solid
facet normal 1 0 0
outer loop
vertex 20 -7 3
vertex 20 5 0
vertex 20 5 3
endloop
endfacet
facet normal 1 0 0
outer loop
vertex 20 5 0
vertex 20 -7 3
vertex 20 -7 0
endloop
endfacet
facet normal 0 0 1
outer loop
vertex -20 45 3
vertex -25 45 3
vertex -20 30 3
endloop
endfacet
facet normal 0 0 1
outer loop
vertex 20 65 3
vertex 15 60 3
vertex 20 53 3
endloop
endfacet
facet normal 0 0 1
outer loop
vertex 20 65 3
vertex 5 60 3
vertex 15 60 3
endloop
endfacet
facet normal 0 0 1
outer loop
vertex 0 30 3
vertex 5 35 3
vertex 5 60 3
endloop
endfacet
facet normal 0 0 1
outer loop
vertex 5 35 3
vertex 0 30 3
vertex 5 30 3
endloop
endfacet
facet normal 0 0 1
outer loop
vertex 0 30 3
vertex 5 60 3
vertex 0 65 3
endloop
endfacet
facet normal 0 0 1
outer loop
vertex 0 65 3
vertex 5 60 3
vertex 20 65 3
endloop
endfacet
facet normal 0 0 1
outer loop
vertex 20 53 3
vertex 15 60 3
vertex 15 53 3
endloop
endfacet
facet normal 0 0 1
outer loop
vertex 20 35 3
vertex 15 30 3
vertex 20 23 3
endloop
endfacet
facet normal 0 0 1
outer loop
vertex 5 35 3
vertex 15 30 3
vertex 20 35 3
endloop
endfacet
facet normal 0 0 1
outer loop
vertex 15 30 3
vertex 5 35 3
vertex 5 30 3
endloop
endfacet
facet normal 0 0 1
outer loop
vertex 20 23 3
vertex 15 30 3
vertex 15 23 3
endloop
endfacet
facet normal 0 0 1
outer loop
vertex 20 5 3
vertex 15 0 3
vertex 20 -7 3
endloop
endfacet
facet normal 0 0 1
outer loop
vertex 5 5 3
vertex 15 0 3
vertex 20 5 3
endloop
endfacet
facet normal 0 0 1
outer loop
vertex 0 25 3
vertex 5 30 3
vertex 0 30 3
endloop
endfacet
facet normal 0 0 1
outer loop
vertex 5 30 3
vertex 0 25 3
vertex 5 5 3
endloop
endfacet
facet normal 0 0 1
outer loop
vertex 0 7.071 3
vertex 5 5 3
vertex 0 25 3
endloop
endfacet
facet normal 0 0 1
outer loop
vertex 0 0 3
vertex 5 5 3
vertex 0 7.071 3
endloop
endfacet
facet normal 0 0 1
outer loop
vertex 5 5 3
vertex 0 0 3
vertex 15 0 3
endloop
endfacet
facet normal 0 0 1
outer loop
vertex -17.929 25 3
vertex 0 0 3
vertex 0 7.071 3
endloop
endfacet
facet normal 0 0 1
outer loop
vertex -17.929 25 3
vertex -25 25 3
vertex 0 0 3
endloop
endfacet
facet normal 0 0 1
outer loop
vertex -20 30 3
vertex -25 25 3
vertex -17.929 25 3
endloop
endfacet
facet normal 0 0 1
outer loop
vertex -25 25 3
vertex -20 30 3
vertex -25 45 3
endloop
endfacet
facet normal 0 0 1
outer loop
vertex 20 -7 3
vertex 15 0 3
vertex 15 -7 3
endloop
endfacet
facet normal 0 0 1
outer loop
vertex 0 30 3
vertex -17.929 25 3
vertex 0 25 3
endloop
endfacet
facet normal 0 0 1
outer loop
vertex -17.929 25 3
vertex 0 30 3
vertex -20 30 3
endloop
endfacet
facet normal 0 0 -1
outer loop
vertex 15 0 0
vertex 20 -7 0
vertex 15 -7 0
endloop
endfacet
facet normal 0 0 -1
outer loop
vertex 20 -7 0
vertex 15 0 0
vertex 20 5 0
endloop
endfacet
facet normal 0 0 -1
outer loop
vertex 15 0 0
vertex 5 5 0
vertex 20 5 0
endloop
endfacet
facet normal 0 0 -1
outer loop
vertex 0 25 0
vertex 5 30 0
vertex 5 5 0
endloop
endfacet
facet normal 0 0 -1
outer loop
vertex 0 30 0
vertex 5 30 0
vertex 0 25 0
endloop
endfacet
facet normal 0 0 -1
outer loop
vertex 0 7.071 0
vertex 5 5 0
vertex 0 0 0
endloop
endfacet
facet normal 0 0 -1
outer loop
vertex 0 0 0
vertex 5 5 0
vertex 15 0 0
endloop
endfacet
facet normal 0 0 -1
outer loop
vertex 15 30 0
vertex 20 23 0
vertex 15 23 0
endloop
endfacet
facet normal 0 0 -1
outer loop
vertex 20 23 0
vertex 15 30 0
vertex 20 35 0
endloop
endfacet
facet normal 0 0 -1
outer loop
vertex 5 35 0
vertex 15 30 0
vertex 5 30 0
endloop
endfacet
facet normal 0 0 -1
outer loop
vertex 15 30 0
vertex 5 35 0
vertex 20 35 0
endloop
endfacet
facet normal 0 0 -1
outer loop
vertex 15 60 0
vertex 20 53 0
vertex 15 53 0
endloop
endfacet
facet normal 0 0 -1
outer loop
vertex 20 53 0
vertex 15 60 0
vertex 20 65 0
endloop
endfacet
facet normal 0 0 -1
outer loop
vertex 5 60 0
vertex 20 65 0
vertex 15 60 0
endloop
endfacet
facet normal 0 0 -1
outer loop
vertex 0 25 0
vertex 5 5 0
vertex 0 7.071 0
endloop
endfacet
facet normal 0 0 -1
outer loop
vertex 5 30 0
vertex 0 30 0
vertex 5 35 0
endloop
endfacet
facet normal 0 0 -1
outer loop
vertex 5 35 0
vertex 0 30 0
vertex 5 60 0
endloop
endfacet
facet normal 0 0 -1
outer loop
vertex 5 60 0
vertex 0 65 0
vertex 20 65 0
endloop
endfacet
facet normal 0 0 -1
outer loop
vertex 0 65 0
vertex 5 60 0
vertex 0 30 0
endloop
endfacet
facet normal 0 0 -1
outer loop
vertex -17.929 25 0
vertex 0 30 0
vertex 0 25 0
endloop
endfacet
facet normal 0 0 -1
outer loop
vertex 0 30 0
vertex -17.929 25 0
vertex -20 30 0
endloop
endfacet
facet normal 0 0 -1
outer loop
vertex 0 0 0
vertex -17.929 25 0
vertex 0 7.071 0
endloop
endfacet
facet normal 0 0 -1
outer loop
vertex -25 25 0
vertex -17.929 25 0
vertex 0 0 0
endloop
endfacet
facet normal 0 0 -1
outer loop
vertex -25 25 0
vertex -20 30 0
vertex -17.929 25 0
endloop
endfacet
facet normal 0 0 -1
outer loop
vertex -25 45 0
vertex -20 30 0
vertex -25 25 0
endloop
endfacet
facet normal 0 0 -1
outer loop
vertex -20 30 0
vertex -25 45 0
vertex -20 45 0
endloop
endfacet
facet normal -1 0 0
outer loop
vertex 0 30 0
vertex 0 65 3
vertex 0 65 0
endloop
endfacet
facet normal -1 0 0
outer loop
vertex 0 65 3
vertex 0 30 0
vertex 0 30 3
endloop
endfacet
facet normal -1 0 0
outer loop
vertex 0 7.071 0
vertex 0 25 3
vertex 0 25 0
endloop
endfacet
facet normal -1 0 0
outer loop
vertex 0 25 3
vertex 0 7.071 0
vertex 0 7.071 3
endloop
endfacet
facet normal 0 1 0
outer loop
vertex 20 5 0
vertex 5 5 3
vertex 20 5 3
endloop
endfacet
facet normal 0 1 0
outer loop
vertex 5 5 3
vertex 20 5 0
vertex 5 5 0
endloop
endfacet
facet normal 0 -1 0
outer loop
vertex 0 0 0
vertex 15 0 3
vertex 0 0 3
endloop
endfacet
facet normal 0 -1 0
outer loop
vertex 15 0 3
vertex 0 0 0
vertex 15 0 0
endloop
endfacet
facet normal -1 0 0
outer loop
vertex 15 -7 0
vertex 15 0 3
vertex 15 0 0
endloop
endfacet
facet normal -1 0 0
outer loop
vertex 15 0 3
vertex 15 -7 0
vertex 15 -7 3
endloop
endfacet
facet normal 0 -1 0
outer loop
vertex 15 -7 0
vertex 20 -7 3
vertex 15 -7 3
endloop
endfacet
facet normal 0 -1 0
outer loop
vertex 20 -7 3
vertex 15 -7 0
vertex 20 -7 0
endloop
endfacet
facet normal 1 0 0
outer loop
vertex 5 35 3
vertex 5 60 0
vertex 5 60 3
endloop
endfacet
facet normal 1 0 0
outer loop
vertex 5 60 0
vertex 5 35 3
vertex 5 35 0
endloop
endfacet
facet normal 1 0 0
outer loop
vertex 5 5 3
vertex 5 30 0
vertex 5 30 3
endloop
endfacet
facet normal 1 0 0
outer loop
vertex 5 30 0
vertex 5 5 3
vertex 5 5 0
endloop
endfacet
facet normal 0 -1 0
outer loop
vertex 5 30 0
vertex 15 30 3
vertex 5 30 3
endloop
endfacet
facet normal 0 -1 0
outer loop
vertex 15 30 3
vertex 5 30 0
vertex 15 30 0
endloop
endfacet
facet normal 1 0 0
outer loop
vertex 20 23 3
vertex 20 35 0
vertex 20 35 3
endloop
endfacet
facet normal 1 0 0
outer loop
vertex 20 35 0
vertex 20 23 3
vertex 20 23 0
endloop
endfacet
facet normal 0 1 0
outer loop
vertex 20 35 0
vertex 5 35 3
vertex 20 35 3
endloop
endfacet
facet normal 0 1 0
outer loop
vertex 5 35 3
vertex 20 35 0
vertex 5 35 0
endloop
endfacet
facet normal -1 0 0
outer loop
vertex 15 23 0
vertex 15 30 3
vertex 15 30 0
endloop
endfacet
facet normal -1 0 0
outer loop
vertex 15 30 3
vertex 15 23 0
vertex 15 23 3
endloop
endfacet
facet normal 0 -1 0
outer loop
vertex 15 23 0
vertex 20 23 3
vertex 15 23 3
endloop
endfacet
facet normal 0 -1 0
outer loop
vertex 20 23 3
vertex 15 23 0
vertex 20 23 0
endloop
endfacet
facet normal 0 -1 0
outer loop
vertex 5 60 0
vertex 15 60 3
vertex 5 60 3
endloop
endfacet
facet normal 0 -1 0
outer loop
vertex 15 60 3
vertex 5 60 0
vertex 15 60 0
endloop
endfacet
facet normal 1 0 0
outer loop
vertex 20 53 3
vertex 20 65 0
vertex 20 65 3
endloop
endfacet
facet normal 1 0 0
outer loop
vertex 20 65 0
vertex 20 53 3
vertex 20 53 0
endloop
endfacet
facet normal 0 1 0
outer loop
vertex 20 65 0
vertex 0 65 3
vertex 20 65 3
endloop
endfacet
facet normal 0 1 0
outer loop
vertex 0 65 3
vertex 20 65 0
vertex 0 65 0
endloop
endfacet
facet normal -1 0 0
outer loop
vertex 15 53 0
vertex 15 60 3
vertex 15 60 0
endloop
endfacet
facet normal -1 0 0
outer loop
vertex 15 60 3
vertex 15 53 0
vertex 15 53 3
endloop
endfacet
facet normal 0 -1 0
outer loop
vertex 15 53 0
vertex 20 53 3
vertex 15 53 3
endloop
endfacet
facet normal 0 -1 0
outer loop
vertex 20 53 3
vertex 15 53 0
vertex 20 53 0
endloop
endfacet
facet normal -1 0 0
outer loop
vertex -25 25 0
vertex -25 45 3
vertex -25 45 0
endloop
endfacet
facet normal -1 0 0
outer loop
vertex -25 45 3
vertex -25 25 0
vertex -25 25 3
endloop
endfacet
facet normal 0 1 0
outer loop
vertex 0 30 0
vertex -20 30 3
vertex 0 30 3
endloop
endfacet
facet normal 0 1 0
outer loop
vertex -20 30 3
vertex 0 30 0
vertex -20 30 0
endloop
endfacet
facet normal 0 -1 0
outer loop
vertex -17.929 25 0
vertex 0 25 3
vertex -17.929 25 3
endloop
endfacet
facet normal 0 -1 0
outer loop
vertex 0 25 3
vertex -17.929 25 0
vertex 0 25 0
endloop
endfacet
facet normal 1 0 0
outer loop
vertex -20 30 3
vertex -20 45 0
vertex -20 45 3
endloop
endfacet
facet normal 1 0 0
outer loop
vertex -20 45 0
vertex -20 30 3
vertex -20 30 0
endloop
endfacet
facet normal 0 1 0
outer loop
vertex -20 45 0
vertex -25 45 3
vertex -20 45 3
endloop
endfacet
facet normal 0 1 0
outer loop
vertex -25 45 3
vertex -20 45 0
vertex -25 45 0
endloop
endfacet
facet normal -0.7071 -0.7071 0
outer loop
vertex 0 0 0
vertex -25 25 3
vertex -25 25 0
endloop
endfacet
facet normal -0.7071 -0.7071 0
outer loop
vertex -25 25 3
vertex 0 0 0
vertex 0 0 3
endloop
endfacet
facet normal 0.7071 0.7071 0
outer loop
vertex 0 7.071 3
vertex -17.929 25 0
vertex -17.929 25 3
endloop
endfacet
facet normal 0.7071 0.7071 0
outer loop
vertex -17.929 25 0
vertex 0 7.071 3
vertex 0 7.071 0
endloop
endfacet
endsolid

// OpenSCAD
// Allgemein
height=3;
width=5;

// Aufhängung
aufhaengungsanzahl=3;
lochabstand=30;
lochtiefe=20;
lochhakenlaenge=7;

// Haken
hakentiefe = 25;
hakenlaenge = 20;


module aufhaengung(position) {
  y_off = lochabstand*position;
  cube([width, y_off, height]);
  translate([0, y_off, 0]) cube([lochtiefe, width, height]);
  translate([lochtiefe-width, y_off-lochhakenlaenge, 0]) cube([width, lochhakenlaenge, height]);
}


module haken() {
  translate([-hakentiefe, hakentiefe, 0]) cube([hakentiefe, width, height]);
  translate([-hakentiefe, hakentiefe, 0 ]) cube([width, hakenlaenge, height]);

  // Stütze
  diag = sqrt(pow(hakentiefe,2) + pow(hakentiefe,2));
  winkel = 45;
  translate([0, 0, 0 ]) rotate([0, 0, winkel]) cube([width, diag, height]);
}


for (i = [ 0 : aufhaengungsanzahl -1 ]) {
  aufhaengung(i);
}
haken();
